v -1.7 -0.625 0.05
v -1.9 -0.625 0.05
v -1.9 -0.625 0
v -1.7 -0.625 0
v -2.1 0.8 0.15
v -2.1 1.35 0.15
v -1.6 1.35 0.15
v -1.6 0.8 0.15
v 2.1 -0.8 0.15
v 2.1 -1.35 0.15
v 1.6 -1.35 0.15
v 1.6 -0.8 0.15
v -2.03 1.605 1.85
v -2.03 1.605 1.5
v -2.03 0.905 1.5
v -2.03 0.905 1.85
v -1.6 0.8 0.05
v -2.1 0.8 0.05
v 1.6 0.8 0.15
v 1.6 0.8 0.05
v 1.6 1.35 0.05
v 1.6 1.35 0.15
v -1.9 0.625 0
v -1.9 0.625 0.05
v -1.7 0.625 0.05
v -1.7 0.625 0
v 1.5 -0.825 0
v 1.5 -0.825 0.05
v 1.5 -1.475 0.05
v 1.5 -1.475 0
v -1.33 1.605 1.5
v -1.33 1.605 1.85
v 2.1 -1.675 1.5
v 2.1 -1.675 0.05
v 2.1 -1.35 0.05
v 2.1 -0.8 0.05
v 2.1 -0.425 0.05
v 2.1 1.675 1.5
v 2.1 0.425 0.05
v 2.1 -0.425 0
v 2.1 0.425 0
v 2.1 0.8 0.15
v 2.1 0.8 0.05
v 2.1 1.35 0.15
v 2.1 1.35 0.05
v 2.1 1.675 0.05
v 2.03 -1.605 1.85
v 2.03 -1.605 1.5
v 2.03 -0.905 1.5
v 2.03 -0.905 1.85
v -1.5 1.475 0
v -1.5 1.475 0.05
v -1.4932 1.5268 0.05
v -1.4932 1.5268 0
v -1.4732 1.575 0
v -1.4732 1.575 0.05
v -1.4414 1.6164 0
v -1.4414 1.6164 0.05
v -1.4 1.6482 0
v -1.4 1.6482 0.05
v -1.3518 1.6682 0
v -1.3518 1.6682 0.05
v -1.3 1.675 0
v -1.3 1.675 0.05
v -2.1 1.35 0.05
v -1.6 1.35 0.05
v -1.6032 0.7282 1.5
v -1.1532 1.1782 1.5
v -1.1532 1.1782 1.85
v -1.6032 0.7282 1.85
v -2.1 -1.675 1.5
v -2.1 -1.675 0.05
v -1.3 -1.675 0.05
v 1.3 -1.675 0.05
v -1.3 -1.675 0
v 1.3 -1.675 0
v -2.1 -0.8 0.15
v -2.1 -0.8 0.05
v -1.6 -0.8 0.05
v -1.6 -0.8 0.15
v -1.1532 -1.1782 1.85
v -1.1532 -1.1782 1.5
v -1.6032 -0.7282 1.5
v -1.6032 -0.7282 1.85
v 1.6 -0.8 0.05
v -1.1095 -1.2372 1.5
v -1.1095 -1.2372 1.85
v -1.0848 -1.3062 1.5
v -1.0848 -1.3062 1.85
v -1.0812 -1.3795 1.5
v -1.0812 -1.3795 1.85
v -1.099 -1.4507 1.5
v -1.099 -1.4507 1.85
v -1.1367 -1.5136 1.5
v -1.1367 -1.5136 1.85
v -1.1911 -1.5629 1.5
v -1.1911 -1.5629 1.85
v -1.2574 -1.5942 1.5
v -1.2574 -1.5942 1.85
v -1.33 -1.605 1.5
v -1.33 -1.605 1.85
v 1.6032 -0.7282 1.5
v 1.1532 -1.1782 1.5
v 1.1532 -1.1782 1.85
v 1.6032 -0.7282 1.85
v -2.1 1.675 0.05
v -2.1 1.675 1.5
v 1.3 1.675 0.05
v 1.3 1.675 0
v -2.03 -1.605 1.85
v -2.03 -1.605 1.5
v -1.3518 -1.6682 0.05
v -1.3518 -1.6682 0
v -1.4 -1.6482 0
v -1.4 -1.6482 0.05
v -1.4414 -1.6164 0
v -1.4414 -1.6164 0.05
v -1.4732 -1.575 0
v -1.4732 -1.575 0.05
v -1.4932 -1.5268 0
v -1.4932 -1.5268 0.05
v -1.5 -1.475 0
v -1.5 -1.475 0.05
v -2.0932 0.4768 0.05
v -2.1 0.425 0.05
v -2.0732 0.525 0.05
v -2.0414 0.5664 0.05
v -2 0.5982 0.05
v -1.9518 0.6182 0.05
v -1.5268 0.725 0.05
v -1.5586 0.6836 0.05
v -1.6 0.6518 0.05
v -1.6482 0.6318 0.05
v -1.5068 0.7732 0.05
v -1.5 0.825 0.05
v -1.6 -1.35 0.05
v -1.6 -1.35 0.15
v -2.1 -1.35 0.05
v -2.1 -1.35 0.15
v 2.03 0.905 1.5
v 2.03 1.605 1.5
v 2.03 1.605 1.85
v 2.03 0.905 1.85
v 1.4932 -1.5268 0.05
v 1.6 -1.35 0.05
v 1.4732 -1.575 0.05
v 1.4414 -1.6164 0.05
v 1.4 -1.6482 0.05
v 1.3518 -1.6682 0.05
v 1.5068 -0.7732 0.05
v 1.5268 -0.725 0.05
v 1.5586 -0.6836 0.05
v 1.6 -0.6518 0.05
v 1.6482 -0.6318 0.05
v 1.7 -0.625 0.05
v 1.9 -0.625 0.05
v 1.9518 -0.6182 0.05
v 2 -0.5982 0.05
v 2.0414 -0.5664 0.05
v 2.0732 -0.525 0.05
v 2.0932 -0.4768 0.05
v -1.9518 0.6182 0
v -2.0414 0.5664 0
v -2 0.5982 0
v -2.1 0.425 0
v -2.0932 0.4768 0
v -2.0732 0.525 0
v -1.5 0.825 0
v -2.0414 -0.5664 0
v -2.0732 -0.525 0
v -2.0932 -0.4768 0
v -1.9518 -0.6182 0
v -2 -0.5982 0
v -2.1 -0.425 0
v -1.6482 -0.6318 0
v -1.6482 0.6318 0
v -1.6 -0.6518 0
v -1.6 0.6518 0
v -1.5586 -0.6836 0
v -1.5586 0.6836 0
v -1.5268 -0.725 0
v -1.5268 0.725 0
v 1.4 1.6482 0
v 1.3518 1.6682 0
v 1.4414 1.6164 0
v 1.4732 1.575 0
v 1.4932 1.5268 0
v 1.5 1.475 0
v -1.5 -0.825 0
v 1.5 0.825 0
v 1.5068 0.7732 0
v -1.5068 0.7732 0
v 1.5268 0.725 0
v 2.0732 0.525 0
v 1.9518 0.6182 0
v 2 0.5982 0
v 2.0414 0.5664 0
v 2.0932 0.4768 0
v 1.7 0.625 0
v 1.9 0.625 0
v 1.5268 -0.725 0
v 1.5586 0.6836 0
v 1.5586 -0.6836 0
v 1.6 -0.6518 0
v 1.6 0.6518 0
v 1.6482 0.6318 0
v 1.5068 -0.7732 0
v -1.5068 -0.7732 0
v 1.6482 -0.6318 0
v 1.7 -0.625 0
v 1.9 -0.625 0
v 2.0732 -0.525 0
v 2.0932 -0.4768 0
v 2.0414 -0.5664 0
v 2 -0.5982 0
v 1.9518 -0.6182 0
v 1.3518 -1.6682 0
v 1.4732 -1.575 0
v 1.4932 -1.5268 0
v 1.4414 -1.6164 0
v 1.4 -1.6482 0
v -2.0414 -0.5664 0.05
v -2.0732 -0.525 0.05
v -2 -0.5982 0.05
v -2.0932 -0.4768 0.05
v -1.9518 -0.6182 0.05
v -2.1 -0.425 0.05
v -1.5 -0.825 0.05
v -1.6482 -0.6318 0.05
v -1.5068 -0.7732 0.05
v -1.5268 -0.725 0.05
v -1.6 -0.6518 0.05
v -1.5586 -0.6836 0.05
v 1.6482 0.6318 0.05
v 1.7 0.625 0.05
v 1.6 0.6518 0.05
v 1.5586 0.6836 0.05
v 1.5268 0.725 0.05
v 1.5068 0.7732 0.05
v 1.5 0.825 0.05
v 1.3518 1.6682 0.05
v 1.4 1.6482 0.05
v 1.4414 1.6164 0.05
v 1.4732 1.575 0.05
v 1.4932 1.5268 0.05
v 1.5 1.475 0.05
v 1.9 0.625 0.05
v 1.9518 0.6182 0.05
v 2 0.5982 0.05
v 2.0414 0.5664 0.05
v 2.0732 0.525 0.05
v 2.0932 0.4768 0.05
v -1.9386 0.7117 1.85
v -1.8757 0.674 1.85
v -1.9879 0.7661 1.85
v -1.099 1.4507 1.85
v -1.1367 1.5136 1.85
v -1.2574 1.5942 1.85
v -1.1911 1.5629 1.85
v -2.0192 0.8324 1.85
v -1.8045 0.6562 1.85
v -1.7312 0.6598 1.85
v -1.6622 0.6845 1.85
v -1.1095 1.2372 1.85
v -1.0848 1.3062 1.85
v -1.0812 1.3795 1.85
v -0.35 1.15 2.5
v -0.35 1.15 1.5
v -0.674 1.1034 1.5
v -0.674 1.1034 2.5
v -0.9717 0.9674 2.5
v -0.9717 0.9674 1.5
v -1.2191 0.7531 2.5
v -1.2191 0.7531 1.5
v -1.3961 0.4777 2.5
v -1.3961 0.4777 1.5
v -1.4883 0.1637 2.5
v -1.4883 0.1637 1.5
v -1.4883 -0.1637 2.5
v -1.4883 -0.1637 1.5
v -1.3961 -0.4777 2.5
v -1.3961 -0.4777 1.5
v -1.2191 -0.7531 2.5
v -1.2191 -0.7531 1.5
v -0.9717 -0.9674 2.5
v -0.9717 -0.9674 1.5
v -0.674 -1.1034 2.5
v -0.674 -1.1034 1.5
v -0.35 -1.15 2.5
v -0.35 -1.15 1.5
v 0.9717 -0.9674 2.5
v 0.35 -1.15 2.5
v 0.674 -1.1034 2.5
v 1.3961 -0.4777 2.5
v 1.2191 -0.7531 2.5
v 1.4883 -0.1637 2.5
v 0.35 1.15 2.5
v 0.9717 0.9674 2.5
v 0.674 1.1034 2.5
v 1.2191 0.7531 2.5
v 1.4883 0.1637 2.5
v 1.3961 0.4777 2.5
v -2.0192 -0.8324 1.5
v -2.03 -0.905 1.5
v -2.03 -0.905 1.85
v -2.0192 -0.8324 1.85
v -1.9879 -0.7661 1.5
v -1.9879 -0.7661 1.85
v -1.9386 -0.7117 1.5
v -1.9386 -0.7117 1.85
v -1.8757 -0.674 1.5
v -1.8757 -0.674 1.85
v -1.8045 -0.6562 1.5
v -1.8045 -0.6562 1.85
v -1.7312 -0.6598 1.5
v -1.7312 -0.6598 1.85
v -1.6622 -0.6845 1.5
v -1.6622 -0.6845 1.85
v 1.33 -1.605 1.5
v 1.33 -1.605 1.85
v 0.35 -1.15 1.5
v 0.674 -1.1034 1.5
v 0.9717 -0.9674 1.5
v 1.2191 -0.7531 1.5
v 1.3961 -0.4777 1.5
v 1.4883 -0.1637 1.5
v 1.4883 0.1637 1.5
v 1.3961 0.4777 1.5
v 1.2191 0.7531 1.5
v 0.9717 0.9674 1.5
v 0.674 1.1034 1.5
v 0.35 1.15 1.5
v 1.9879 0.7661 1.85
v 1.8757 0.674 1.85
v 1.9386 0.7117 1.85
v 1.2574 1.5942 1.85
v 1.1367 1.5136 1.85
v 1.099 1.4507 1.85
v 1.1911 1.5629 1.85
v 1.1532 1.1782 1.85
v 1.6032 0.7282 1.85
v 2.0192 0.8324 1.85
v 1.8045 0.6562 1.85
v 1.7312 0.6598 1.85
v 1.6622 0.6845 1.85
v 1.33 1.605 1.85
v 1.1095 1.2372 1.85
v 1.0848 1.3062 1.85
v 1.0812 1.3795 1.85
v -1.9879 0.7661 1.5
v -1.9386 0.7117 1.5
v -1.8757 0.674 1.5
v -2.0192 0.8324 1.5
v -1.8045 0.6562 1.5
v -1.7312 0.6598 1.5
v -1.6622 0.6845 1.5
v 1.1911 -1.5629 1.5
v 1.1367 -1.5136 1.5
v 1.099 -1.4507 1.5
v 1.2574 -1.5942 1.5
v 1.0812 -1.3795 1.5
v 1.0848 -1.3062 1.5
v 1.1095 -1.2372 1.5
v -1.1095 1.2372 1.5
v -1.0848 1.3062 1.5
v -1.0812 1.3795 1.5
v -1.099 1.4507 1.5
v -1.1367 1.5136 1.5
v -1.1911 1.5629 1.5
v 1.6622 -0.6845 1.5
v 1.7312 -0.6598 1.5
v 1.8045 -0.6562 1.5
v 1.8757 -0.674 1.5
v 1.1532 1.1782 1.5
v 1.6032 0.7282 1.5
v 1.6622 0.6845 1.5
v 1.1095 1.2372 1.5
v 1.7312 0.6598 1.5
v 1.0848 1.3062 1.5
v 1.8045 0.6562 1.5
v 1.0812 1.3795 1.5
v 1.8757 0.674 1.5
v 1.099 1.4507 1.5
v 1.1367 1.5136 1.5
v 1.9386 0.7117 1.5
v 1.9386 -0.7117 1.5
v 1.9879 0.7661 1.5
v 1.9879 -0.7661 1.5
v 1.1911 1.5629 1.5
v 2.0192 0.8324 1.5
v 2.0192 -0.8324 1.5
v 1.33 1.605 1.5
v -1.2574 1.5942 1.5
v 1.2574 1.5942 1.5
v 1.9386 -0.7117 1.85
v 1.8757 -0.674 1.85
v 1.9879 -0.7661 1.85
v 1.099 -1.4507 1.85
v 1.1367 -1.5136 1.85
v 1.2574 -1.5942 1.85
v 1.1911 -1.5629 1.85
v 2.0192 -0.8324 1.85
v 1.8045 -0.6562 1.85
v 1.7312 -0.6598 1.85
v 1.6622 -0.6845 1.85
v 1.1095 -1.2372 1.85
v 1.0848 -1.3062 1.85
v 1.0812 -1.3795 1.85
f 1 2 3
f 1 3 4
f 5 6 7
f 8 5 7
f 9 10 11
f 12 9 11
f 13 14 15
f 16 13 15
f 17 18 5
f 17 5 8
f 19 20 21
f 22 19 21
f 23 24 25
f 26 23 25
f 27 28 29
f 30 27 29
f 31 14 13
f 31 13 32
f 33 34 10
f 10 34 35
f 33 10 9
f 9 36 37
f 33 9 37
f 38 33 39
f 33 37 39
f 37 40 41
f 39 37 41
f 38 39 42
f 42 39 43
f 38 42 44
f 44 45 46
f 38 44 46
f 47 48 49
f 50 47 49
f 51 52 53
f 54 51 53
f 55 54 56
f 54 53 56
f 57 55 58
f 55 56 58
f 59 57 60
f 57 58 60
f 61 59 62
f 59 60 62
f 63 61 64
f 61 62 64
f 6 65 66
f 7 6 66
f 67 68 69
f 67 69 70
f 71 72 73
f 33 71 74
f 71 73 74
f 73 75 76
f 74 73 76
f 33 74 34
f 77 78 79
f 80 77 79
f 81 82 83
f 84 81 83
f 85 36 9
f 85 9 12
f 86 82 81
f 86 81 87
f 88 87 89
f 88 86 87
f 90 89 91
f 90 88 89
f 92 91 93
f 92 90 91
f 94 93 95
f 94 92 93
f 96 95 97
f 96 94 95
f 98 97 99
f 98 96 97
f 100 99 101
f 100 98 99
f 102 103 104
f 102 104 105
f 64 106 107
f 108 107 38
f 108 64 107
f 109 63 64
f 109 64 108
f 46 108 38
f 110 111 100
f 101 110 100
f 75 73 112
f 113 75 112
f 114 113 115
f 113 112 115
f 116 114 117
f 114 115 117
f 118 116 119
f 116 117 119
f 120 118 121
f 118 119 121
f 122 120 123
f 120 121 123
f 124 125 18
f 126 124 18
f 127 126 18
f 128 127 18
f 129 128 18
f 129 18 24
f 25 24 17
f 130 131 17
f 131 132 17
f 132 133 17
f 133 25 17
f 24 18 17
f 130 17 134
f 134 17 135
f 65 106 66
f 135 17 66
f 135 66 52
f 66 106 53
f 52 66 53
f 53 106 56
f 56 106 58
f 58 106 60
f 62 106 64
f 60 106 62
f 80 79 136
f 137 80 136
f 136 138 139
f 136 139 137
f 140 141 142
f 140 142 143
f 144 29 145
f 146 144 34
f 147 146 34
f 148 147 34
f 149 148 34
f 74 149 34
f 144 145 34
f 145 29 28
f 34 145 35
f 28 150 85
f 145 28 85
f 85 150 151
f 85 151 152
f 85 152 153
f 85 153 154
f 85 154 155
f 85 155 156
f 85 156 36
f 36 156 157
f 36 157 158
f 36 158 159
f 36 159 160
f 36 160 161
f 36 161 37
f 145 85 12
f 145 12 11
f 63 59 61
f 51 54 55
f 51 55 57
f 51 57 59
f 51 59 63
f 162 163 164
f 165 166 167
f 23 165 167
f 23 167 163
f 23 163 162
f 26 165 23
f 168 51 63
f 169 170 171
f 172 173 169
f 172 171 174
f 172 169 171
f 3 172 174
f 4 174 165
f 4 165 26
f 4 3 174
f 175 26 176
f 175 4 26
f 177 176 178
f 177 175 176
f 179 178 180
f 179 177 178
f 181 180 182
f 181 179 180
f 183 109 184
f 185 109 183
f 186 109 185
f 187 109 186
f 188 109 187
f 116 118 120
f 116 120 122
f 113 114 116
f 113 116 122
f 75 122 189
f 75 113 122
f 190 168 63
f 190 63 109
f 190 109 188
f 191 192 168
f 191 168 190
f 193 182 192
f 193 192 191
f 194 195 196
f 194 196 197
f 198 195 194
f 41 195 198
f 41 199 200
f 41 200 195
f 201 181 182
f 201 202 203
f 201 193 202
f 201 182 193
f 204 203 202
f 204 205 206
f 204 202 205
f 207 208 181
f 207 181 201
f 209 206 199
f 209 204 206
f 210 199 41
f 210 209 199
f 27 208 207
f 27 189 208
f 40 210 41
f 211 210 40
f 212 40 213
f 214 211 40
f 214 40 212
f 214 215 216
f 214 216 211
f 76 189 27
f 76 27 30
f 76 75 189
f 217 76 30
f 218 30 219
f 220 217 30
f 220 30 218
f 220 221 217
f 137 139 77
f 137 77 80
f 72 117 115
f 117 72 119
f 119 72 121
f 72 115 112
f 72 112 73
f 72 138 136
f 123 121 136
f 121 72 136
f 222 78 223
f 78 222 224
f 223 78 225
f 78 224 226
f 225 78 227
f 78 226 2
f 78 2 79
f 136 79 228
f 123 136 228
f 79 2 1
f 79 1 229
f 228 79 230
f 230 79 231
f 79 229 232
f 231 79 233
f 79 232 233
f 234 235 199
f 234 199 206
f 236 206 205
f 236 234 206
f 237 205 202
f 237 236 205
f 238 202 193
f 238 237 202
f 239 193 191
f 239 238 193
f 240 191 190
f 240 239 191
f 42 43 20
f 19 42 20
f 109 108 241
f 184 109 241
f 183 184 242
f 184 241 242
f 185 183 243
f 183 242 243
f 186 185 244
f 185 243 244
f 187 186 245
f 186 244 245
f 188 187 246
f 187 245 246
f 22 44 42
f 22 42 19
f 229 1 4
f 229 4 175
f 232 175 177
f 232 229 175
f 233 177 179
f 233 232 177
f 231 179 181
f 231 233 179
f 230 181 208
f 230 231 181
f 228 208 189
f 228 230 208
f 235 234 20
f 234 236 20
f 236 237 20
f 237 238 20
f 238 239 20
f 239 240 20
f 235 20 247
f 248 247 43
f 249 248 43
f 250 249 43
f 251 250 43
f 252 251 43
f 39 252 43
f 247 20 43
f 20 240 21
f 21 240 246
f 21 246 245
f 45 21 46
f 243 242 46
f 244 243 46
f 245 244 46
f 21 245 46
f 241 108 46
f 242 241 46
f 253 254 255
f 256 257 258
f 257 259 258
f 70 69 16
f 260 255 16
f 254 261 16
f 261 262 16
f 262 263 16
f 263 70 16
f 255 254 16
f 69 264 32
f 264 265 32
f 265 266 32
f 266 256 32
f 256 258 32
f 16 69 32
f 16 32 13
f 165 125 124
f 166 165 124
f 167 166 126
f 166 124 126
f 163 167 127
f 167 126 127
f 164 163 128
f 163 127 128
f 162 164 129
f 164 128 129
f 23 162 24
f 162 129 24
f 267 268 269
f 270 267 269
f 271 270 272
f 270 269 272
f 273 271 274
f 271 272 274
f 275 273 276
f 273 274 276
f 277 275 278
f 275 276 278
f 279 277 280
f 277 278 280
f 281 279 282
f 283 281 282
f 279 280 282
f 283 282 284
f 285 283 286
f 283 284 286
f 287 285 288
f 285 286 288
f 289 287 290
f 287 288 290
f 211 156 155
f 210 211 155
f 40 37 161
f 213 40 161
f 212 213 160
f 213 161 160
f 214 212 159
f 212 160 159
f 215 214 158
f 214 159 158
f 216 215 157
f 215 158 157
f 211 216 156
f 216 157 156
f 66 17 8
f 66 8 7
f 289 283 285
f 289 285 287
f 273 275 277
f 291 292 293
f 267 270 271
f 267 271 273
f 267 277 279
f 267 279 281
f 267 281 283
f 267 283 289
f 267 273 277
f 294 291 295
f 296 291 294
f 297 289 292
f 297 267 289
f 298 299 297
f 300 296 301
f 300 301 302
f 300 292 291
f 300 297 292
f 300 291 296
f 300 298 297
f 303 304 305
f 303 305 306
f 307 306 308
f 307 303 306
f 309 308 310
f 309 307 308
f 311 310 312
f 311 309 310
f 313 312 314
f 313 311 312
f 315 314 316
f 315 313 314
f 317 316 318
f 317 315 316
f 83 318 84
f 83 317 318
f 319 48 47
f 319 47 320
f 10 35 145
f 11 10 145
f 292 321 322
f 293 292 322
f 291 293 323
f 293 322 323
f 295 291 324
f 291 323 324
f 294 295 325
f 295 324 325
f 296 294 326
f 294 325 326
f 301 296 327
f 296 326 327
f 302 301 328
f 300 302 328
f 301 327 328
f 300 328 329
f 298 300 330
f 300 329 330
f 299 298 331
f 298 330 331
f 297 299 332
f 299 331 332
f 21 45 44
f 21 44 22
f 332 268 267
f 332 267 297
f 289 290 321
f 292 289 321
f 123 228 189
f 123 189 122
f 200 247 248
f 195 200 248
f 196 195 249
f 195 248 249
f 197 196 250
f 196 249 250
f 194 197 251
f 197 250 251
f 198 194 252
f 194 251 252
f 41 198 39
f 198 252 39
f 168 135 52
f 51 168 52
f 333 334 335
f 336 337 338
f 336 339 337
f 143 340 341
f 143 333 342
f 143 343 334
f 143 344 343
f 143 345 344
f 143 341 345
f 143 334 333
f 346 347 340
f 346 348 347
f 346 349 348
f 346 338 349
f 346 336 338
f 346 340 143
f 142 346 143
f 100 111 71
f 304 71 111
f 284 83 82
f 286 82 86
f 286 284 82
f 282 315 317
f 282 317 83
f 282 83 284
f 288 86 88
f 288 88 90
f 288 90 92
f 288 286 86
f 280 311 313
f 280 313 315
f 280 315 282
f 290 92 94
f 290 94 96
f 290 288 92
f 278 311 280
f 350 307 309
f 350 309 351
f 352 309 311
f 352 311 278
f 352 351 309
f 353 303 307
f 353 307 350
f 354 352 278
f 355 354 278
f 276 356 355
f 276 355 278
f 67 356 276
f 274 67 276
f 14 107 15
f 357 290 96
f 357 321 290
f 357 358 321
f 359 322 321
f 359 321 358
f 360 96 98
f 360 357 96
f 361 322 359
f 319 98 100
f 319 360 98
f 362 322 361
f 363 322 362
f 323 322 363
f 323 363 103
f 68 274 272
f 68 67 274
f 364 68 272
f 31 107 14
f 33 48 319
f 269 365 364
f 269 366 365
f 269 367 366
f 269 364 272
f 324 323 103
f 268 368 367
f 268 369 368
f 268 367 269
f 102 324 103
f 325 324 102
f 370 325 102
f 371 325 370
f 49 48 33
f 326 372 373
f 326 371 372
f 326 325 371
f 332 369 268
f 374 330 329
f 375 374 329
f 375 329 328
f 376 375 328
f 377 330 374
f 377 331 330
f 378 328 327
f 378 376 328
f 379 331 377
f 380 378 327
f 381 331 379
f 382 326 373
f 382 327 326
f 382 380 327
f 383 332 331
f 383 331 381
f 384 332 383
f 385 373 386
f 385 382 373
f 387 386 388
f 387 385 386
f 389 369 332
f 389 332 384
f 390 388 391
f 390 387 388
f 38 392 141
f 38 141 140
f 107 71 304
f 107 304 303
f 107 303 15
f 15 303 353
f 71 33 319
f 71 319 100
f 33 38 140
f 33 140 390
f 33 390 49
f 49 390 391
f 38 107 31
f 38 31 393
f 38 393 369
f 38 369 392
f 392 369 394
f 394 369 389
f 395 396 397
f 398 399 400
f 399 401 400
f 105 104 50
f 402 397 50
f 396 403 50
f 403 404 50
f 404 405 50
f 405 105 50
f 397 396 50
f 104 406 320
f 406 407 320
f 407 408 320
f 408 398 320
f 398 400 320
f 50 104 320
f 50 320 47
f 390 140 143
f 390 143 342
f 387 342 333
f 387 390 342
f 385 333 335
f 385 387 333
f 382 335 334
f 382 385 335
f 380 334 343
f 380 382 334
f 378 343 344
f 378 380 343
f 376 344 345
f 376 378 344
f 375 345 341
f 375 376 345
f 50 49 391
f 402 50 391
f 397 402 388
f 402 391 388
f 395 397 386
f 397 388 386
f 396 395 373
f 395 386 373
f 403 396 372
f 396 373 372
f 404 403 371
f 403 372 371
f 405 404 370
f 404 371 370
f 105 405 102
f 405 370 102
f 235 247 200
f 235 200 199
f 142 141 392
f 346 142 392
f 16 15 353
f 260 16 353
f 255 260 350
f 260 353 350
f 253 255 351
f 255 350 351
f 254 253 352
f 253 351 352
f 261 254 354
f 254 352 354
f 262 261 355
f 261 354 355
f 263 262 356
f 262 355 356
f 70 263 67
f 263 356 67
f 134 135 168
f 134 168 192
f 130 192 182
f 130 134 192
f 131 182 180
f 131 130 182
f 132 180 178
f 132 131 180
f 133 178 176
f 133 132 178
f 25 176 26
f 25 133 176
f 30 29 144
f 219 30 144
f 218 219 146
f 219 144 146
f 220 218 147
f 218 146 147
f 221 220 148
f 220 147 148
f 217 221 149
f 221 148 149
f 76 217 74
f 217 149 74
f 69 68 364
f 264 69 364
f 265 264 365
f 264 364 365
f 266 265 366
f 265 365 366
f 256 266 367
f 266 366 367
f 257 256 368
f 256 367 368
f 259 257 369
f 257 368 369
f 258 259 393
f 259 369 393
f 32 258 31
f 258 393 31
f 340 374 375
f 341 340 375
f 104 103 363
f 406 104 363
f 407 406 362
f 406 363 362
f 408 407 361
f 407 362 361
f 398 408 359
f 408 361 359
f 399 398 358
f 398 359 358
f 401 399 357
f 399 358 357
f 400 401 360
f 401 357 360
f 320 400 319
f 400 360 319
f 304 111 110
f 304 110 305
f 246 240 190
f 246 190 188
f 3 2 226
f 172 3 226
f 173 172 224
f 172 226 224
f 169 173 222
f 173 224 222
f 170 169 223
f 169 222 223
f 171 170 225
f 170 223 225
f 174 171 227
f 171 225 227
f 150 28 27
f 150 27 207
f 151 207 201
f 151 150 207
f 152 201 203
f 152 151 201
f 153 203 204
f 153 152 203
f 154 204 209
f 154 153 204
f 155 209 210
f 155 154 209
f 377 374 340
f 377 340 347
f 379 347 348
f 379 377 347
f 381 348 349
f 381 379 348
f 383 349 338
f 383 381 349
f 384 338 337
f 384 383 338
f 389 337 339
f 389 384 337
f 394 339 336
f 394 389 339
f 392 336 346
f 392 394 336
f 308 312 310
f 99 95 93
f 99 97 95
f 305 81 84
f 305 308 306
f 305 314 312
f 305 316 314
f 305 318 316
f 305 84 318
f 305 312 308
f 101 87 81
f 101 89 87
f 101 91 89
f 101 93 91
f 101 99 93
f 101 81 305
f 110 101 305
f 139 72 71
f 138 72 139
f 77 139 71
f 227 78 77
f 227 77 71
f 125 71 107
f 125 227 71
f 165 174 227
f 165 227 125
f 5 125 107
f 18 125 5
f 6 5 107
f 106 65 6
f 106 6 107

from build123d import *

# Parameters (mm, degrees)
SKETCH_W                   = 4.2
SKETCH_H                   = 3.35
PAD_DEPTH                  = 1.45
PAD001_DEPTH               = 0.35
PAD001_MIRRORED_2_DEPTH    = 0.35
PAD002_DEPTH               = 1
SKETCH004_W                = 0.5
SKETCH004_H                = 0.55
POCKET_DEPTH               = 0.1
SKETCH004_MIRRORED002_2_W  = 0.5
SKETCH004_MIRRORED002_2_H  = 0.55
POCKET_MIRRORED002_2_DEPTH = 0.1
PAD004_DEPTH               = 0.05


with BuildPart() as part:
    # Sketch → Pad (new body)
    with BuildSketch(Plane.XY):
        Rectangle(SKETCH_W, SKETCH_H)
    extrude(amount=PAD_DEPTH)

    # Sketch001 (on Face6 of Pad) → Pad001 (join)
    with BuildSketch(Plane.XY.offset(1.45)):
        with BuildLine():
            Line((-2.03, 1.605), (-1.33, 1.605))
            ThreePointArc((-1.153223, 1.178223), (-1.09903, 1.450671), (-1.33, 1.605))
            Line((-1.153223, 1.178223), (-1.603223, 0.728223))
            ThreePointArc((-2.03, 0.905), (-1.875671, 0.67403), (-1.603223, 0.728223))
            Line((-2.03, 1.605), (-2.03, 0.905))
        make_face()
    pad001 = extrude(amount=PAD001_DEPTH)

    # Sketch001 Mirrored 2 → Pad001 Mirrored 2 (add)
    with BuildSketch(Plane(origin=(0, 0, 1.45), x_dir=(-1, 0, 0), z_dir=(0, 0, -1))):
        with BuildLine():
            Line((-2.03, 1.605), (-1.33, 1.605))
            ThreePointArc((-1.153223, 1.178223), (-1.09903, 1.450671), (-1.33, 1.605))
            Line((-1.153223, 1.178223), (-1.603223, 0.728223))
            ThreePointArc((-2.03, 0.905), (-1.875671, 0.67403), (-1.603223, 0.728223))
            Line((-2.03, 1.605), (-2.03, 0.905))
        make_face()
    pad001_mirrored_2 = extrude(amount=-PAD001_MIRRORED_2_DEPTH)

    # Mirrored001: Pad001, Pad001 Mirrored 2 across Sketch001 H_Axis
    add(pad001.mirror(Plane(origin=(0, 0, 1.45), x_dir=(0, 0, 1), z_dir=(0, 1, 0))))
    add(pad001_mirrored_2.mirror(Plane(origin=(0, 0, 1.45), x_dir=(0, 0, 1), z_dir=(0, 1, 0))))

    # Sketch002 (on Face5 of MultiTransform) → Pad002 (join)
    with BuildSketch(Plane.XY.offset(1.45)):
        with BuildLine():
            ThreePointArc((-0.35, 1.15), (-1.5, 0), (-0.35, -1.15))
            Line((-0.35, -1.15), (0.35, -1.15))
            ThreePointArc((0.35, -1.15), (1.5, 0), (0.35, 1.15))
            Line((-0.35, 1.15), (0.35, 1.15))
        make_face()
    extrude(amount=PAD002_DEPTH)

    # Sketch004 (on Face4 of Pad002) → Pocket (cut)
    with BuildSketch(Plane(origin=(0, 0, 0), x_dir=(1, 0, 0), z_dir=(0, 0, -1))):
        with Locations((-1.85, 1.075)):
            Rectangle(SKETCH004_W, SKETCH004_H)
    pocket = extrude(amount=-POCKET_DEPTH, mode=Mode.SUBTRACT)

    # Sketch004 Mirrored002 2 → Pocket Mirrored002 2 (cut)
    with BuildSketch(Plane(origin=(0, 0, 0), x_dir=(-1, 0, 0), z_dir=(0, 0, 1))):
        with Locations((-1.85, 1.075)):
            Rectangle(SKETCH004_MIRRORED002_2_W, SKETCH004_MIRRORED002_2_H)
    pocket_mirrored002_2 = extrude(amount=POCKET_MIRRORED002_2_DEPTH, mode=Mode.SUBTRACT)

    # Mirrored003: Pocket, Pocket Mirrored002 2 across Sketch004 H_Axis
    add(pocket.mirror(Plane(origin=(0, 0, 0), x_dir=(0, 0, -1), z_dir=(0, -1, 0))), mode=Mode.SUBTRACT)
    add(pocket_mirrored002_2.mirror(Plane(origin=(0, 0, 0), x_dir=(0, 0, -1), z_dir=(0, -1, 0))), mode=Mode.SUBTRACT)

    # Sketch005 (on Face4 of MultiTransform001) → Pad004 (join)
    with BuildSketch(Plane(origin=(0, 0, 0), x_dir=(1, 0, 0), z_dir=(0, 0, -1))):
        with BuildLine():
            ThreePointArc((-1.9, 0.625), (-2.041421, 0.566421), (-2.1, 0.425))
            Line((-2.1, 0.425), (-2.1, -0.425))
            ThreePointArc((-2.1, -0.425), (-2.041421, -0.566421), (-1.9, -0.625))
            Line((-1.9, -0.625), (-1.7, -0.625))
            ThreePointArc((-1.5, -0.825), (-1.558579, -0.683579), (-1.7, -0.625))
            Line((-1.5, -0.825), (-1.5, -1.475))
            ThreePointArc((-1.5, -1.475), (-1.441421, -1.616421), (-1.3, -1.675))
            Line((-1.3, -1.675), (1.3, -1.675))
            ThreePointArc((1.3, -1.675), (1.441421, -1.616421), (1.5, -1.475))
            Line((1.5, -0.825), (1.5, -1.475))
            ThreePointArc((1.7, -0.625), (1.558579, -0.683579), (1.5, -0.825))
            Line((1.9, -0.625), (1.7, -0.625))
            ThreePointArc((1.9, -0.625), (2.041421, -0.566421), (2.1, -0.425))
            Line((2.1, 0.425), (2.1, -0.425))
            ThreePointArc((2.1, 0.425), (2.041421, 0.566421), (1.9, 0.625))
            Line((1.9, 0.625), (1.7, 0.625))
            ThreePointArc((1.5, 0.825), (1.558579, 0.683579), (1.7, 0.625))
            Line((1.5, 0.825), (1.5, 1.475))
            ThreePointArc((1.5, 1.475), (1.441421, 1.616421), (1.3, 1.675))
            Line((-1.3, 1.675), (1.3, 1.675))
            ThreePointArc((-1.3, 1.675), (-1.441421, 1.616421), (-1.5, 1.475))
            Line((-1.5, 0.825), (-1.5, 1.475))
            ThreePointArc((-1.7, 0.625), (-1.558579, 0.683579), (-1.5, 0.825))
            Line((-1.9, 0.625), (-1.7, 0.625))
        make_face()
    extrude(amount=PAD004_DEPTH)


with BuildPart() as part_1:
    # Body placement: moved
    add(part.part.moved(Location((0, 0, 0.05))))


solid = part_1.part
